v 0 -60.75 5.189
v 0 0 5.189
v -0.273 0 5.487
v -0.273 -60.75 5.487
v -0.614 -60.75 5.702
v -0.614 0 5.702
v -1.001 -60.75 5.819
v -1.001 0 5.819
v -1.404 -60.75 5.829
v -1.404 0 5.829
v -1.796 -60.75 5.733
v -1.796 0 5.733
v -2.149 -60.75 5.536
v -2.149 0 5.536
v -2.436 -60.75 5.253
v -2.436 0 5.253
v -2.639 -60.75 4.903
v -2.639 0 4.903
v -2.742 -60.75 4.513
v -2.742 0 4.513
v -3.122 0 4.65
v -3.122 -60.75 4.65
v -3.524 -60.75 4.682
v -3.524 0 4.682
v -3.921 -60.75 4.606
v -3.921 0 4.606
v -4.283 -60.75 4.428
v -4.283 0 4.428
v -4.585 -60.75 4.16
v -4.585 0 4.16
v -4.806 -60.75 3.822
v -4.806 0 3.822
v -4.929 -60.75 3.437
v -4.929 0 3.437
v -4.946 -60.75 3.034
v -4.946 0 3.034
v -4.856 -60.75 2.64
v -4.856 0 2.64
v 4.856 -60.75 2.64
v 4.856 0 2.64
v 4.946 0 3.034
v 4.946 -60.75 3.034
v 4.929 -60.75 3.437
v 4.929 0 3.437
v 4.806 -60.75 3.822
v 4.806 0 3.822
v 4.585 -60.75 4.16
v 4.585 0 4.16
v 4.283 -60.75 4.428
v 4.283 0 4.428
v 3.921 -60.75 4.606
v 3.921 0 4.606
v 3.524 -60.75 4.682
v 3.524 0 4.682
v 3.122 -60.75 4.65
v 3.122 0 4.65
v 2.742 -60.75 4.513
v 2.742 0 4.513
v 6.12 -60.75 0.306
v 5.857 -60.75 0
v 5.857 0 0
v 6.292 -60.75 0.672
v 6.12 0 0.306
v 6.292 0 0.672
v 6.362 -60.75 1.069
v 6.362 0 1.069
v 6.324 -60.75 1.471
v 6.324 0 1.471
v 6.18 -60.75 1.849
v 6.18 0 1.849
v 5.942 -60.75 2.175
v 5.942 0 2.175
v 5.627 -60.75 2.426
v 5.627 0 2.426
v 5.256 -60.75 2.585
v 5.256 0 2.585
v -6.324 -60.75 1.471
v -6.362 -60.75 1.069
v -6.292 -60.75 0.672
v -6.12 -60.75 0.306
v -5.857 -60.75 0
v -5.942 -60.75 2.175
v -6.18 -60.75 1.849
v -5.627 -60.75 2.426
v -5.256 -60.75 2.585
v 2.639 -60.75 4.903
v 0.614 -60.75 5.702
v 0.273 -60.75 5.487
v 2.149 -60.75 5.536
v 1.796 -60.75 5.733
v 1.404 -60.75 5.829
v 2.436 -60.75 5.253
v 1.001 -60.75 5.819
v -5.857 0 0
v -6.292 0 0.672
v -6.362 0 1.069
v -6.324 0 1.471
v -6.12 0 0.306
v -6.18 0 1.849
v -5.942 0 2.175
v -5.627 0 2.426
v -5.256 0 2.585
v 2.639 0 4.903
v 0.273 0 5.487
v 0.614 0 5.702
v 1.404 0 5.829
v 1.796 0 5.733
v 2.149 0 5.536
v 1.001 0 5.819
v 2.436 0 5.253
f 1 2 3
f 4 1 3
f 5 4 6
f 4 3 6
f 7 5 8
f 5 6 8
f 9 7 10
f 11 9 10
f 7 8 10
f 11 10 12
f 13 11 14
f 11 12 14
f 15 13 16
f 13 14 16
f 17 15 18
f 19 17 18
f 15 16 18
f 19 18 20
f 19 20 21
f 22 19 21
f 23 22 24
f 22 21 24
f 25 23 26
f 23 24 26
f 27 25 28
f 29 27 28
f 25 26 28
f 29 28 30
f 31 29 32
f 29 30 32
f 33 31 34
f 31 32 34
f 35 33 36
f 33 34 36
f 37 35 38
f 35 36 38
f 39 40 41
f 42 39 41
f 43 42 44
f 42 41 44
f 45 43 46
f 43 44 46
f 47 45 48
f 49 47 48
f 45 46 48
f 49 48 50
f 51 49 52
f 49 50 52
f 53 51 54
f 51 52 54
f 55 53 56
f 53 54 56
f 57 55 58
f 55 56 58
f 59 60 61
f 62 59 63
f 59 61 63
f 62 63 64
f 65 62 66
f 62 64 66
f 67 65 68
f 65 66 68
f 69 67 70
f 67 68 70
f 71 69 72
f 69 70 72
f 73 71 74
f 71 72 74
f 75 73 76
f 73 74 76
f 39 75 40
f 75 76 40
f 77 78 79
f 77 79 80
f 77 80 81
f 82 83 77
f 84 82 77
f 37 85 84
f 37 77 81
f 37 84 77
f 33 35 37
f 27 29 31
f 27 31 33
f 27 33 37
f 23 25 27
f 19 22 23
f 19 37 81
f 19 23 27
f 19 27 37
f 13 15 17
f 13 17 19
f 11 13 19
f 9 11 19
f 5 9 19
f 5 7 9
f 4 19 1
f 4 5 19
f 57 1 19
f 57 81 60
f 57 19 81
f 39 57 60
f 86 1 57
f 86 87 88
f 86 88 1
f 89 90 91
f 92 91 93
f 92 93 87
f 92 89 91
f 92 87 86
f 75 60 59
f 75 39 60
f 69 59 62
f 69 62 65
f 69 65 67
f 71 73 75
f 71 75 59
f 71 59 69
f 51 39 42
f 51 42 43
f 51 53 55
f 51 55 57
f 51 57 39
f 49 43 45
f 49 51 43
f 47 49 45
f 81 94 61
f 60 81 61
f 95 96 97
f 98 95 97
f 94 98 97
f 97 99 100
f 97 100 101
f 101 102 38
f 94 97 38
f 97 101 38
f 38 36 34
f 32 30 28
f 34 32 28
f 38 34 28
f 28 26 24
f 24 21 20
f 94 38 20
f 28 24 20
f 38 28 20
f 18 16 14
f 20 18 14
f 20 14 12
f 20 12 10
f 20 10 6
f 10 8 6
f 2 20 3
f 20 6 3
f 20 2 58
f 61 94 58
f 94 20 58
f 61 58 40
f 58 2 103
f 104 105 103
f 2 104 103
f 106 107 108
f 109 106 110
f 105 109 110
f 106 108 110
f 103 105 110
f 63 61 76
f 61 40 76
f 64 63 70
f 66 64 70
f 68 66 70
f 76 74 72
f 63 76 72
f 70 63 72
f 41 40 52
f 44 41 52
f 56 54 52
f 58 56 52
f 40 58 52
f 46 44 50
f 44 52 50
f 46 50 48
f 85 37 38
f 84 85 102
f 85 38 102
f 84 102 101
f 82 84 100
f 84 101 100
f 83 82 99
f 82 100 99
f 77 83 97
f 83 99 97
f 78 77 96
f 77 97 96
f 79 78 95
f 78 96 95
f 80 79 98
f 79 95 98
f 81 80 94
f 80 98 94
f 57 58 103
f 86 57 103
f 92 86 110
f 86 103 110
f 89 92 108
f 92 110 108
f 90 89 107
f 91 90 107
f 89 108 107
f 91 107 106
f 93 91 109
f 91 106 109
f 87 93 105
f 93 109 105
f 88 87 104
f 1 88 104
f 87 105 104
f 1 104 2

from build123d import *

# Parameters (mm, degrees)
F1_DEPTH = 60.75
F2_W     = 29.965812
F2_H     = 12.152278
F3_DEPTH = 80


with BuildPart() as f1:
    # F0 (on Front) → F1 (new body)
    with BuildSketch(Plane.XZ):
        with BuildLine():
            ThreePointArc((4.855605, 2.640416), (4.442922, 4.303856), (2.741867, 4.513024))
            ThreePointArc((2.741867, 4.513024), (1.603415, 5.794144), (0, 5.188834))
            ThreePointArc((0, 5.188834), (-1.603415, 5.794144), (-2.741867, 4.513024))
            ThreePointArc((-2.741867, 4.513024), (-4.442922, 4.303856), (-4.855605, 2.640416))
            ThreePointArc((-4.855605, 2.640416), (-6.264609, 1.664686), (-5.856982, 0))
            ThreePointArc((-5.856982, 0), (-6.651149, -1.518762), (-5.516596, -2.803335))
            ThreePointArc((-5.516596, -2.803335), (-5.513992, -4.5172), (-3.912424, -5.12738))
            ThreePointArc((-3.912424, -5.12738), (-3.113645, -6.643722), (-1.411962, -6.439723))
            ThreePointArc((-1.411962, -6.439723), (0, -7.411166), (1.411962, -6.439723))
            ThreePointArc((1.411962, -6.439723), (3.113645, -6.643722), (3.912424, -5.12738))
            ThreePointArc((3.912424, -5.12738), (5.513992, -4.5172), (5.516596, -2.803335))
            ThreePointArc((5.516596, -2.803335), (6.651149, -1.518762), (5.856982, 0))
            ThreePointArc((5.856982, 0), (6.264609, 1.664686), (4.855605, 2.640416))
        make_face()
    extrude(amount=F1_DEPTH)

    # F2 (on Front) → F3 (cut)
    with BuildSketch(Plane.XZ):
        with Locations((-0.254262, -6.076139)):
            Rectangle(F2_W, F2_H)
    extrude(amount=F3_DEPTH, mode=Mode.SUBTRACT)


solid = f1.part
